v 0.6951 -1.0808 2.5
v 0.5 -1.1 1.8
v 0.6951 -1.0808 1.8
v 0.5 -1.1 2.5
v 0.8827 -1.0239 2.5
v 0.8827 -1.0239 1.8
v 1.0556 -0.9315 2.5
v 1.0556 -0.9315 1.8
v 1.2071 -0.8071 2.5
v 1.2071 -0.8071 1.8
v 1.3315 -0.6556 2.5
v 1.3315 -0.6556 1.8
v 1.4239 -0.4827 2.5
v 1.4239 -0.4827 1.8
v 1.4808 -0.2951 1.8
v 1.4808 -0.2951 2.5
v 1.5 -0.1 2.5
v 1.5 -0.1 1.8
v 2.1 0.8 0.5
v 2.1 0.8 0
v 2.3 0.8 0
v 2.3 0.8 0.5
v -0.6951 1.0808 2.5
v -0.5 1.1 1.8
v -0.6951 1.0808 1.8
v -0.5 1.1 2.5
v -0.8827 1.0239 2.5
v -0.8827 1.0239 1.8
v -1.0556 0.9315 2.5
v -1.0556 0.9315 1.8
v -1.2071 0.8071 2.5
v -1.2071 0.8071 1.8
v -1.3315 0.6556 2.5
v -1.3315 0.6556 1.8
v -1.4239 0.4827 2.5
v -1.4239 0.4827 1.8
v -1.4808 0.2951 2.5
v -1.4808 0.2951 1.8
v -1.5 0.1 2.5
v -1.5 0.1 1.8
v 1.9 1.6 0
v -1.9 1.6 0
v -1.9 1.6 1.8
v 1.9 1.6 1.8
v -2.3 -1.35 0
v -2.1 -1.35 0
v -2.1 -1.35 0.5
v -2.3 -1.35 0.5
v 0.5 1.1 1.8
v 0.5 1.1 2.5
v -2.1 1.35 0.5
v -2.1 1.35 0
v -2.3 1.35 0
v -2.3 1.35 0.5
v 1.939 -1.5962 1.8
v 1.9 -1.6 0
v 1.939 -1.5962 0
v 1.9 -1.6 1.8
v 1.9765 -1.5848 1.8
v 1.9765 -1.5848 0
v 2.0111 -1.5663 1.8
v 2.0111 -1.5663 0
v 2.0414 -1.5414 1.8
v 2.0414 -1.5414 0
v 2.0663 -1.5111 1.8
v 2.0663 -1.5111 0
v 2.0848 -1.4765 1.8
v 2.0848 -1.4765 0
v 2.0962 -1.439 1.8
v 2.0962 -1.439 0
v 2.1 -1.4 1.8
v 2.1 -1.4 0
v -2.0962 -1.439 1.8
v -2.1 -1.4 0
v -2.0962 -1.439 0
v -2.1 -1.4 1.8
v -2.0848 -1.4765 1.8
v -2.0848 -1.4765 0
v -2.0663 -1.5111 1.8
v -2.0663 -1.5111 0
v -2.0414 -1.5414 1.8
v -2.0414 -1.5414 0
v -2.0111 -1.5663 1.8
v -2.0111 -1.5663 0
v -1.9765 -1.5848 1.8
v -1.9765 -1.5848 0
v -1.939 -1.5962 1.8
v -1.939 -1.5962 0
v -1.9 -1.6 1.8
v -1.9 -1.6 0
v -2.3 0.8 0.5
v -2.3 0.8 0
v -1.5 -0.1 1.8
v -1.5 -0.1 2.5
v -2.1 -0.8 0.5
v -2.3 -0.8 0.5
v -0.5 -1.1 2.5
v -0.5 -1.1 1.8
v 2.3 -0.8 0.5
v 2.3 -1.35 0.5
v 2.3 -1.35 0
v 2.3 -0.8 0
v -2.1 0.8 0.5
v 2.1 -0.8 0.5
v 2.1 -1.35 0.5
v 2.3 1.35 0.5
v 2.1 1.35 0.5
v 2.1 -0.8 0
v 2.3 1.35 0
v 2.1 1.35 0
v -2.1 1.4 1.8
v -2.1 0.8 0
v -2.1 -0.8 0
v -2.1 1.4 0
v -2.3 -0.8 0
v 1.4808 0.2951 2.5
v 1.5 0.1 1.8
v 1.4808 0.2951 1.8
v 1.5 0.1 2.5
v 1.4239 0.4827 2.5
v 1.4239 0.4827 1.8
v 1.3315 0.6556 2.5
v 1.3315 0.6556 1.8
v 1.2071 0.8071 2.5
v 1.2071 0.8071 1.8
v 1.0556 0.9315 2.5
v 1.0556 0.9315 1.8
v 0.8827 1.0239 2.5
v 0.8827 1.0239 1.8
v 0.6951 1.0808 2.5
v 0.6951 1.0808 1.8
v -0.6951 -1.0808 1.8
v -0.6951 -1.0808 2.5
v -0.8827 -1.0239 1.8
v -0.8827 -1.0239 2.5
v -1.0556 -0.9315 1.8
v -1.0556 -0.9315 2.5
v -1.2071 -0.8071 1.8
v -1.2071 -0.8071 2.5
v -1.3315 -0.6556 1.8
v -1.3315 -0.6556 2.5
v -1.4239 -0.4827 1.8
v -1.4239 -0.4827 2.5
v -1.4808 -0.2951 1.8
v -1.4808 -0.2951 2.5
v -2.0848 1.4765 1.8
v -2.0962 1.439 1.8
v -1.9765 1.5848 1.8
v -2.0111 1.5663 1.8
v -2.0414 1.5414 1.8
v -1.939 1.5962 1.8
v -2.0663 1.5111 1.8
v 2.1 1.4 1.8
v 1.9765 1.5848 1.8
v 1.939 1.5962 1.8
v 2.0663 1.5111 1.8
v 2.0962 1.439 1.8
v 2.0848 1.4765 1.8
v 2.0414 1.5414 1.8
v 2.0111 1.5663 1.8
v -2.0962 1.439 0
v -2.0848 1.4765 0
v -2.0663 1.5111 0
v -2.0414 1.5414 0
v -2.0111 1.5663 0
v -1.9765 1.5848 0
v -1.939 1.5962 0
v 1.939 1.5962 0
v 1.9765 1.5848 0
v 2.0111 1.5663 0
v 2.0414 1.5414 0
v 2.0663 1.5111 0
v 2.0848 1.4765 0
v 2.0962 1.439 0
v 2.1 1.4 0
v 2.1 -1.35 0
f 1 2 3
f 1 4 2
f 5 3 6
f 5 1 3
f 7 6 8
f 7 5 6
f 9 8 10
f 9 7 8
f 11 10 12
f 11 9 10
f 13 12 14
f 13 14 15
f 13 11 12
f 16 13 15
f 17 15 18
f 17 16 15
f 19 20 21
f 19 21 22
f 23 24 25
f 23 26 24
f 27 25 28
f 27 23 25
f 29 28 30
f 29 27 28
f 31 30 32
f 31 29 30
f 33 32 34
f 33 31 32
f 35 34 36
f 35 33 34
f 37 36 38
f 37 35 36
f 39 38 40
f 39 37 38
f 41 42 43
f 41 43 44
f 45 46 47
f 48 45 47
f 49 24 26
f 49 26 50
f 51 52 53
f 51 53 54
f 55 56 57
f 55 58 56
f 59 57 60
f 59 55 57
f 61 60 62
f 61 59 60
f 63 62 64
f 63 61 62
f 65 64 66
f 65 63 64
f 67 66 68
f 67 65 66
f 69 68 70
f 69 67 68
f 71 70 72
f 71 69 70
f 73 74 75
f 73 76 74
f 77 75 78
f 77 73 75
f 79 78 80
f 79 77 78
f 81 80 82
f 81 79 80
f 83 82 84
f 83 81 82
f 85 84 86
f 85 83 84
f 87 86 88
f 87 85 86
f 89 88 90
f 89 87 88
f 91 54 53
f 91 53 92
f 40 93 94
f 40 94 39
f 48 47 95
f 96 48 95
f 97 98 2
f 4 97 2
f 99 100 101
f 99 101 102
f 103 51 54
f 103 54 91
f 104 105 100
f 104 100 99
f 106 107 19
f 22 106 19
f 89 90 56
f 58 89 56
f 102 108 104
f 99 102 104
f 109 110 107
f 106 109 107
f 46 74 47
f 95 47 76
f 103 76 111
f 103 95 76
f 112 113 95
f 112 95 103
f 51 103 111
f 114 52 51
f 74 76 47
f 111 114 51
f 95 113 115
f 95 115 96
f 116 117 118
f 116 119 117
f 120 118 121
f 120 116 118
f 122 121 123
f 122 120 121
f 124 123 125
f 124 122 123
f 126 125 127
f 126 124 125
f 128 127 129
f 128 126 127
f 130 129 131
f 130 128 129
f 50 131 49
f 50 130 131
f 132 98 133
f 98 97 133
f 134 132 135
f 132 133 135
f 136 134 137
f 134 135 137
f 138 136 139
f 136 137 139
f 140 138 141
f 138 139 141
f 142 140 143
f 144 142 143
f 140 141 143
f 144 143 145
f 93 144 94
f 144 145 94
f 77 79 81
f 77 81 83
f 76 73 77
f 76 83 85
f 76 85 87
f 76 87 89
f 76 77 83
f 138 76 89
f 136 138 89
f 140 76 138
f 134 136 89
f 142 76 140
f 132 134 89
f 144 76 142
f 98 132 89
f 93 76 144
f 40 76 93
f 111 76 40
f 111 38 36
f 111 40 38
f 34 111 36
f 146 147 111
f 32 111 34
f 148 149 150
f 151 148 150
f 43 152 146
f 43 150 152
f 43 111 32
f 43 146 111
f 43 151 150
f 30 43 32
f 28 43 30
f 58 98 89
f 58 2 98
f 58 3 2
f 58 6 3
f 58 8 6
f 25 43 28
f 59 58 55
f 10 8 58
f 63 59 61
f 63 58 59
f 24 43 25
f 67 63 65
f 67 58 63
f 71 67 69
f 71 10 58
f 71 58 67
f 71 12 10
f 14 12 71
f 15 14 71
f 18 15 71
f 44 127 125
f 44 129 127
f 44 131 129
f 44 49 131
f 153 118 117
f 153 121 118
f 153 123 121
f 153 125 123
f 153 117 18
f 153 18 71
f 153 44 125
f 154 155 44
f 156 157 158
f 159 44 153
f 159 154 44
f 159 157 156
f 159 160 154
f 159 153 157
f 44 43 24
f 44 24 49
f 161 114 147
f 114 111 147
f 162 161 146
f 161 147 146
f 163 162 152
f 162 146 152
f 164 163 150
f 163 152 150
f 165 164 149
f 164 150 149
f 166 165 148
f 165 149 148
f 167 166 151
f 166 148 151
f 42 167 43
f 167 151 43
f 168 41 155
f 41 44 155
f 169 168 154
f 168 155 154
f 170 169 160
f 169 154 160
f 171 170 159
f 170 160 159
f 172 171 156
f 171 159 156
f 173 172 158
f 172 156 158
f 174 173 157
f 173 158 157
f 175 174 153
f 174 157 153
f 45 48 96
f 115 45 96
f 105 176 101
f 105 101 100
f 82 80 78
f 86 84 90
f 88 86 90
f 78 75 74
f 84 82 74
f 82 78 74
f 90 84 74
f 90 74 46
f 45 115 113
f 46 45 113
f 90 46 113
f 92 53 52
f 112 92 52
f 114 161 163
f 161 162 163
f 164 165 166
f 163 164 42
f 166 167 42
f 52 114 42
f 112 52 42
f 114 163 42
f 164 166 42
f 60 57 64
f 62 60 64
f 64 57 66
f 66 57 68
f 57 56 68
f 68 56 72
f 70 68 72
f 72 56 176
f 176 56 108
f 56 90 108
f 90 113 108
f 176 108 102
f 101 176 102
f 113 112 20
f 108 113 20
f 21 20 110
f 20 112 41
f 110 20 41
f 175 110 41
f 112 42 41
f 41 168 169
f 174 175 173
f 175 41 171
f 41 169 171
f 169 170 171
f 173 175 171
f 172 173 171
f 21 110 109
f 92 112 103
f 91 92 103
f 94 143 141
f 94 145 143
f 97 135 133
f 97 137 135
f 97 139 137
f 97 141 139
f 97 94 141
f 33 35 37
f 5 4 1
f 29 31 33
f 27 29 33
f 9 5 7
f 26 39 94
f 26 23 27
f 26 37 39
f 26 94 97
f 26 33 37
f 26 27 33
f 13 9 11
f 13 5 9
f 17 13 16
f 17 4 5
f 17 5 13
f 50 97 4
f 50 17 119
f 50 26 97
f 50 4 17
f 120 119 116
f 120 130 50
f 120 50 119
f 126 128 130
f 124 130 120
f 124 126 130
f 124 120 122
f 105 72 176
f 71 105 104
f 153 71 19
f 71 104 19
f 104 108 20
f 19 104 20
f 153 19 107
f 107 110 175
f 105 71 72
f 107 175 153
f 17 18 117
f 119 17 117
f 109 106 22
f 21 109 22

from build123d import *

# Parameters (mm, degrees)
SKETCH_W                = 4.2
SKETCH_H                = 3.2
PAD_DEPTH               = 1.8
FILLET_R                = 0.2
FILLET001_R             = 0.2
FILLET002_R             = 0.2
FILLET003_R             = 0.2
SKETCH001_W             = 3
SKETCH001_H             = 2.2
PAD001_DEPTH            = 0.7
FILLET004_R             = 1
SKETCH002_W             = 0.55
SKETCH002_H             = 0.5
PAD002_DEPTH            = 0.2
SKETCH002_MIRRORED_2_W  = 0.55
SKETCH002_MIRRORED_2_H  = 0.5
PAD002_MIRRORED_2_DEPTH = 0.2


with BuildPart() as part:
    # Sketch → Pad (new body)
    with BuildSketch(Plane.XY):
        Rectangle(SKETCH_W, SKETCH_H)
    extrude(amount=PAD_DEPTH)

    # Fillet
    fillet_edges = [part.edges().sort_by_distance(p)[0] for p in [
        (-2.1, -1.6, 0.9),
    ]]
    fillet(fillet_edges, radius=FILLET_R)

    # Fillet001
    fillet001_edges = [part.edges().sort_by_distance(p)[0] for p in [
        (2.1, -1.6, 0.9),
    ]]
    fillet(fillet001_edges, radius=FILLET001_R)

    # Fillet002
    fillet002_edges = [part.edges().sort_by_distance(p)[0] for p in [
        (-2.1, 1.6, 0.9),
    ]]
    fillet(fillet002_edges, radius=FILLET002_R)

    # Fillet003
    fillet003_edges = [part.edges().sort_by_distance(p)[0] for p in [
        (2.1, 1.6, 0.9),
    ]]
    fillet(fillet003_edges, radius=FILLET003_R)

    # Sketch001 (on Face6 of Pad) → Pad001 (join)
    with BuildSketch(Plane.XY.offset(1.8)):
        Rectangle(SKETCH001_W, SKETCH001_H)
    extrude(amount=PAD001_DEPTH)

    # Fillet004
    fillet004_edges = [part.edges().sort_by_distance(p)[0] for p in [
        (1.5, -1.1, 2.15),
        (-1.5, -1.1, 2.15),
        (-1.5, 1.1, 2.15),
        (1.5, 1.1, 2.15),
    ]]
    fillet(fillet004_edges, radius=FILLET004_R)

    # Sketch002 (on Face14 of Fillet004) → Pad002 (join)
    with BuildSketch(Plane(origin=(-2.1, 0, 0), x_dir=(0, -1, 0), z_dir=(-1, 0, 0))):
        with Locations((-1.075, 0.25)):
            Rectangle(SKETCH002_W, SKETCH002_H)
    pad002 = extrude(amount=PAD002_DEPTH)

    # Sketch002 Mirrored 2 → Pad002 Mirrored 2 (add)
    with BuildSketch(Plane.YZ.offset(-2.1)):
        with Locations((-1.075, 0.25)):
            Rectangle(SKETCH002_MIRRORED_2_W, SKETCH002_MIRRORED_2_H)
    pad002_mirrored_2 = extrude(amount=-PAD002_MIRRORED_2_DEPTH)

    # Mirrored001: Pad002, Pad002 Mirrored 2 across YZ
    add(pad002.mirror(Plane.YZ))
    add(pad002_mirrored_2.mirror(Plane.YZ))


solid = part.part
